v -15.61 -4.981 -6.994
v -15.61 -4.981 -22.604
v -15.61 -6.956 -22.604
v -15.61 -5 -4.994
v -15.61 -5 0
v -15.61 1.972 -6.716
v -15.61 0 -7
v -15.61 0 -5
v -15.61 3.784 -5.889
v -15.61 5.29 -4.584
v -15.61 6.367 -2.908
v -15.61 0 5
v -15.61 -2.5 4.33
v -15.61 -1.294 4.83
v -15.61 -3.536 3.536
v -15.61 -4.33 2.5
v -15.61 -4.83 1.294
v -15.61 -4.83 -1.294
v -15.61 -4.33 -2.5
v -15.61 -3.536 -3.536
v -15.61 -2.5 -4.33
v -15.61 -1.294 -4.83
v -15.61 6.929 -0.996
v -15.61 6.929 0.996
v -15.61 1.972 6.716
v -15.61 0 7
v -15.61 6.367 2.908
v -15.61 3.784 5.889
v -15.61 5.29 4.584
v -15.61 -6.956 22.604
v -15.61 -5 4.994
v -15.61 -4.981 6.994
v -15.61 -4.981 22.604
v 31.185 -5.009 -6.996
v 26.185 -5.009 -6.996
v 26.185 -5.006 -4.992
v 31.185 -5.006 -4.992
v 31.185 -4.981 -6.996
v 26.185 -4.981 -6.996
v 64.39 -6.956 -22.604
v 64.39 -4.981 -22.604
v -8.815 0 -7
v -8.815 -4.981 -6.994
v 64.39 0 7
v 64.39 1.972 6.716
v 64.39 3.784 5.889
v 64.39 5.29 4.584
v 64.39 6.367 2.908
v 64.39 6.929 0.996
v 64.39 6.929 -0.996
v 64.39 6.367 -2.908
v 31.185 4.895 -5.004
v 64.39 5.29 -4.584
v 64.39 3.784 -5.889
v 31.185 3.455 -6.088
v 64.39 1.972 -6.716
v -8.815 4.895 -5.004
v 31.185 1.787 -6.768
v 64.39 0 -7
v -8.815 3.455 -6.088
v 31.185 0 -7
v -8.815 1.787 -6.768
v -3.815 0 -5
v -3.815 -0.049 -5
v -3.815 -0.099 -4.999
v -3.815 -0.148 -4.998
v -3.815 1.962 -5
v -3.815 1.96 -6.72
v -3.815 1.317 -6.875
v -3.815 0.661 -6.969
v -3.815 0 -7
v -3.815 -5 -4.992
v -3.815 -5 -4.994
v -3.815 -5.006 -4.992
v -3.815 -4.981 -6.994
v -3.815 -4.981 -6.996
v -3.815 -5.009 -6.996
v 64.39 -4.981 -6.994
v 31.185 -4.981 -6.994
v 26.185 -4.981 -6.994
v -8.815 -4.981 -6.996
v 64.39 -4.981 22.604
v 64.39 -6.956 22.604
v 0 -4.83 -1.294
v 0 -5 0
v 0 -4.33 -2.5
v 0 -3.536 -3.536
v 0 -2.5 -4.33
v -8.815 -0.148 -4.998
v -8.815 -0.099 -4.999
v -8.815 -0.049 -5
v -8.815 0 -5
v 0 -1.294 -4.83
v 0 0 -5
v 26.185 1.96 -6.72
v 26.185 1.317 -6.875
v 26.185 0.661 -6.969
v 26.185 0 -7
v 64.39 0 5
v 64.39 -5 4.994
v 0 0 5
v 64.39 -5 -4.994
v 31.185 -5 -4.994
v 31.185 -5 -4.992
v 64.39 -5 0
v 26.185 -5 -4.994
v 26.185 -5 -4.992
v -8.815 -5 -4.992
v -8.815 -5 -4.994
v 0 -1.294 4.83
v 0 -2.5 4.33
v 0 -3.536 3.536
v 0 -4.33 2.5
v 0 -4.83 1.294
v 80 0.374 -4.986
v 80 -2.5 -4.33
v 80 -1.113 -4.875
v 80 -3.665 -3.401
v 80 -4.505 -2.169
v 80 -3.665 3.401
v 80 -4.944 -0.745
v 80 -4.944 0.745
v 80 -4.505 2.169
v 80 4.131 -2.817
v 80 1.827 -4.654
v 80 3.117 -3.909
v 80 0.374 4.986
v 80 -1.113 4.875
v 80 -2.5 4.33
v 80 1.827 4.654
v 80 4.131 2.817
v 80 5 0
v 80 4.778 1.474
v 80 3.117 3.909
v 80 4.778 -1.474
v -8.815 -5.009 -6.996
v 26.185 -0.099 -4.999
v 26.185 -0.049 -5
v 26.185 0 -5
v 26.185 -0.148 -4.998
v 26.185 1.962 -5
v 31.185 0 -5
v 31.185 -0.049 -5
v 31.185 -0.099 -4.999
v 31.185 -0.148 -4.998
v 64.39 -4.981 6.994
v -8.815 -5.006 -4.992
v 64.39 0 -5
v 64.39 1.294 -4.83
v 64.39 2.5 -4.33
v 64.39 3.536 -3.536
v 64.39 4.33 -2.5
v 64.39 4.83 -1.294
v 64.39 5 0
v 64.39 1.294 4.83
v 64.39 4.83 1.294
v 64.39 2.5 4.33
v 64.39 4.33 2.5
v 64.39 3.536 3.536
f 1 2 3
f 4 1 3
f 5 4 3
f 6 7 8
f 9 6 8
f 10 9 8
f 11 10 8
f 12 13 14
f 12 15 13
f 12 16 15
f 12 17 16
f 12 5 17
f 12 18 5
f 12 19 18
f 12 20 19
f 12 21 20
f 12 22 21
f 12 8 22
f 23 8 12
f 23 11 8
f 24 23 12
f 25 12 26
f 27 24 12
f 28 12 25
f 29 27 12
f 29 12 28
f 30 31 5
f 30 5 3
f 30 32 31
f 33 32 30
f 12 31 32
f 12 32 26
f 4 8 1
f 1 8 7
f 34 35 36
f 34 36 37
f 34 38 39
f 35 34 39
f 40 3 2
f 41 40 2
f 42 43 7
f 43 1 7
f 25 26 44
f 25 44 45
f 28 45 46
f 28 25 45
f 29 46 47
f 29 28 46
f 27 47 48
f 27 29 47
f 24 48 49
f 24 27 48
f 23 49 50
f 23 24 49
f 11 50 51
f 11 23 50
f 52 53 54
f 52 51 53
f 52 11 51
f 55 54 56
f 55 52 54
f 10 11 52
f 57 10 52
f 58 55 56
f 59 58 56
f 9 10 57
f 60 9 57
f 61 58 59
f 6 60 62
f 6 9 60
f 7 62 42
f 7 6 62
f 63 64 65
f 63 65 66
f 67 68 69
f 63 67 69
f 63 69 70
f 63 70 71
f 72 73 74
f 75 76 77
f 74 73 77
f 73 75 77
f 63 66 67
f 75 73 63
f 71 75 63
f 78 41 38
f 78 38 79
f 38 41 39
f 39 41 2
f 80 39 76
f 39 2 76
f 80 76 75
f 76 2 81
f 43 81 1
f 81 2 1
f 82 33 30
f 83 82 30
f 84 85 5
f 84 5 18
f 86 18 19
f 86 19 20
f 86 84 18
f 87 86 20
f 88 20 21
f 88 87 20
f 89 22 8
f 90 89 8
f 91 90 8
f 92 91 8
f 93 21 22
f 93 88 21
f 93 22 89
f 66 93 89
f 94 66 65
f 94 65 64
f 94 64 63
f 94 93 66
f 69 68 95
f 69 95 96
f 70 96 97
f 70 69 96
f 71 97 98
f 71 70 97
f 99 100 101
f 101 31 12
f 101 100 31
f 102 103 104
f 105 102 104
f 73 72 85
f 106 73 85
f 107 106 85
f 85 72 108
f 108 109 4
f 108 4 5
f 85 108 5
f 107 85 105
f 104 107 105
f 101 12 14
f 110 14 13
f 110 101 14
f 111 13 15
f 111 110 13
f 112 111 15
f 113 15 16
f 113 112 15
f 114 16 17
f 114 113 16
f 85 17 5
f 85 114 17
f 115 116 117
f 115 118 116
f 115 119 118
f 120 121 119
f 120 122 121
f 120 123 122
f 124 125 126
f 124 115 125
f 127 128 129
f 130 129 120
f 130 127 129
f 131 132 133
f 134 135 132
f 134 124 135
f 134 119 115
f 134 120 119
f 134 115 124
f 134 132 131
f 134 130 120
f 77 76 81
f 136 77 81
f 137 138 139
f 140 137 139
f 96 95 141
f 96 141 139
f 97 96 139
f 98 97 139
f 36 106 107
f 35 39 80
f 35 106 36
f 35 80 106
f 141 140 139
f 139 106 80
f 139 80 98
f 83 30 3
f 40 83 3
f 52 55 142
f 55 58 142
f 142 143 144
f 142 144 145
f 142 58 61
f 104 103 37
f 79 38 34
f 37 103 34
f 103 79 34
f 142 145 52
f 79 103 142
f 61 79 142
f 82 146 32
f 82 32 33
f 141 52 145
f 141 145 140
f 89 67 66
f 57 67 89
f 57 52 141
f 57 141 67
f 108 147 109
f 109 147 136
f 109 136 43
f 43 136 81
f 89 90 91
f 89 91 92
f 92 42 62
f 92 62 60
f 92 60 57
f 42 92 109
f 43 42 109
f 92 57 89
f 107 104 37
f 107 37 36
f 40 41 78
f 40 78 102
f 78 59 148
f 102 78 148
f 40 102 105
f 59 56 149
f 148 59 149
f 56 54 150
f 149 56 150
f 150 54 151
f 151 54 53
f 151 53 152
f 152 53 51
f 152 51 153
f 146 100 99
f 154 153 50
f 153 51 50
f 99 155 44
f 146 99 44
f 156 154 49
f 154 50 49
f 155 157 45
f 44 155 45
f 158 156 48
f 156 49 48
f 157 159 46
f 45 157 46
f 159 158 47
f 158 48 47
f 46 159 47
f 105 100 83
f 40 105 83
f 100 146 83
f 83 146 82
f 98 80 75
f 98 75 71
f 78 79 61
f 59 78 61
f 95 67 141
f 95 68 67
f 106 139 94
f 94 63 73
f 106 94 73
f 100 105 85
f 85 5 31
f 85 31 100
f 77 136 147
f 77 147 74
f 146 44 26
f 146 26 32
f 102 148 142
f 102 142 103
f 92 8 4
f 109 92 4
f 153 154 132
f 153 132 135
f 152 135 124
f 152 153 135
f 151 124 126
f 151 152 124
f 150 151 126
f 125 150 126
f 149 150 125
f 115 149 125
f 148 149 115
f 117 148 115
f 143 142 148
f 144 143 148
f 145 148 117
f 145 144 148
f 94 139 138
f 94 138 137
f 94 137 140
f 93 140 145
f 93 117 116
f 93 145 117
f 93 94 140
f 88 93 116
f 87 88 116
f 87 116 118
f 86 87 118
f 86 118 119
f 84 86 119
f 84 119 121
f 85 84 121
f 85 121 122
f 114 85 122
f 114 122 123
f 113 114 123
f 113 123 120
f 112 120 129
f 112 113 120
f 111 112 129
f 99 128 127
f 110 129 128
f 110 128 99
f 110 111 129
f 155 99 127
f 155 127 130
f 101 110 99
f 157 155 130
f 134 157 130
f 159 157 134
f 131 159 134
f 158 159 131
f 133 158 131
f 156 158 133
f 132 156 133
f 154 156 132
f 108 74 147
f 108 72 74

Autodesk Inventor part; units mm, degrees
ref_plane "YZ Plane" through (0, 0, 0) normal (1, 0, 0) x (0, 1, 0)
ref_plane "XZ Plane" through (0, 0, 0) normal (0, 1, 0) x (-1, 0, 0)
ref_plane "XY Plane" through (0, 0, 0) normal (0, 0, 1) x (1, 0, 0)
sketch "Цилиндр" plane through (0, 0, 0) normal (1, 0, 0) x (0, 1, 0)
  line L0 (5, 0) -> (-5, 0)
  line L1 (0, 5) -> (0, -5)
  circle A0 centre (0, 0) radius 5
  dimension "d0" = 10
extrude "Выдавливание1" add sketch "Цилиндр" along normal blind 80 and the other way blind 15.61
sketch "Корпус" plane through (-15.61, 0, 0) normal (-1, 0, 0) x (0, 0, 1)
  arc A0 (5, 0) -> (-5, 0) centre (0, 0) ccw
  circle A1 centre (0, 0) radius 5
  line L0 (0, 5) -> (0, -5)
  line L1 (-5, 0) -> (5, 0)
  line L2 (-4.999794, -5) -> (5, -5)
  arc A2 (5, 0) -> (-5, 0) centre (0, 0) ccw
  line L3 (5, 0) -> (4.993827, -5)
  line L4 (-4.993645, -5) -> (-5, 0)
  line L5 (-22.603669, -4.981004) -> (-22.603669, -6.955879)
  arc A3 (0, 7) -> (-7, -0.000001) centre (0, 0) ccw
  line L6 (-22.603669, -6.955879) -> (2.271039, -6.955879)
  line L7 (22.603669, -4.981004) -> (22.603669, -6.955879)
  arc A4 (7, -0.000001) -> (0, 7) centre (0, 0) ccw
  line L8 (22.603669, -6.955879) -> (2.271039, -6.955879)
  line L9 (-6.993669, -4.981004) -> (-7, -0.000001)
  line L10 (-22.603669, -4.981004) -> (-6.993669, -4.981004)
  line L11 (7, -0.000001) -> (6.99385, -4.981004)
  line L12 (22.603669, -4.981004) -> (6.99385, -4.981004)
  dimension "d12" = 15.61
sketch "Корпус outline for Выдавливание2" plane through (-15.61, 0, 0) normal (-1, 0, 0) x (0, 0, 1)
  line L0 (-22.603669, -6.955879) -> (-22.603669, -4.981004)
  line L1 (2.271039, -6.955879) -> (-22.603669, -6.955879)
  line L2 (-22.603669, -4.981004) -> (-6.993669, -4.981004)
  line L3 (22.603669, -6.955879) -> (2.271039, -6.955879)
  line L4 (-6.993669, -4.981004) -> (-7, -0.000001)
  line L5 (22.603669, -4.981004) -> (22.603669, -6.955879)
  arc A0 (-7, -0.000001) -> (0, 7) centre (0, 0) cw
  line L6 (6.99385, -4.981004) -> (22.603669, -4.981004)
  arc A1 (0, 7) -> (7, -0.000001) centre (0, 0) cw
  line L7 (7, -0.000001) -> (6.99385, -4.981004)
  arc A2 (5, 0) -> (0, 5) centre (0, 0) ccw
  arc A3 (0, 5) -> (-5, 0) centre (0, 0) ccw
  line L8 (-5, 0) -> (-4.993645, -5)
  line L9 (-4.993645, -5) -> (0, -5)
  line L10 (0, -5) -> (4.993827, -5)
  line L11 (4.993827, -5) -> (5, 0)
extrude "Выдавливание2" add sketch "Корпус outline for Выдавливание2" against normal blind 80
sketch "Выемка" plane through (64.39, -0.000001, -7) normal (0, -0.001271, -0.9999992) x (-1, 0, 0)
  line L0 (80, -4.981007) -> (80, 0)
  line L1 (80, 0) -> (0, 0)
  line L2 (0, -4.981007) -> (0, 0)
  line L3 (80, -4.981007) -> (0, -4.981007)
  line L4 (80, -5.008896) -> (-15.61, -5.008896)
  line L5 (80, 6.991104) -> (0, 6.991104)
  line L6 (33.204769, 6.991104) -> (33.204769, -5.008896)
  line L7 (33.204769, 6.991104) -> (73.204769, 6.991104)
  line L8 (73.204769, -5.008896) -> (73.204769, 6.991104)
  line L9 (33.204769, -5.008896) -> (73.204769, -5.008896)
  line L10 (38.204769, 1.959942) -> (38.204769, -5.008896)
  line L11 (68.204769, 1.959942) -> (68.204769, -5.008896)
  line L12 (38.204769, -5.008896) -> (38.204769, 1.959942)
  line L13 (68.204769, 1.959942) -> (38.204769, 1.959942)
  line L14 (33.204769, -5.008896) -> (38.204769, -5.008896)
  line L15 (68.204769, -5.008896) -> (73.204769, -5.008896)
  point P0 (64.39, -0.008896)
  dimension "d15" = 30
  dimension "d22" = 5
  dimension "d23" = 5
extrude "Выдавливание3" cut sketch "Выемка" against normal blind 2 contours L8 L4 L11 L3 | L3 L11 L1 L8 | L1 L11 L13 L10 L6 L5 L8 | L10 L4 L6 L3 | L3 L6 L1 L10
properties part number "lw_5"
